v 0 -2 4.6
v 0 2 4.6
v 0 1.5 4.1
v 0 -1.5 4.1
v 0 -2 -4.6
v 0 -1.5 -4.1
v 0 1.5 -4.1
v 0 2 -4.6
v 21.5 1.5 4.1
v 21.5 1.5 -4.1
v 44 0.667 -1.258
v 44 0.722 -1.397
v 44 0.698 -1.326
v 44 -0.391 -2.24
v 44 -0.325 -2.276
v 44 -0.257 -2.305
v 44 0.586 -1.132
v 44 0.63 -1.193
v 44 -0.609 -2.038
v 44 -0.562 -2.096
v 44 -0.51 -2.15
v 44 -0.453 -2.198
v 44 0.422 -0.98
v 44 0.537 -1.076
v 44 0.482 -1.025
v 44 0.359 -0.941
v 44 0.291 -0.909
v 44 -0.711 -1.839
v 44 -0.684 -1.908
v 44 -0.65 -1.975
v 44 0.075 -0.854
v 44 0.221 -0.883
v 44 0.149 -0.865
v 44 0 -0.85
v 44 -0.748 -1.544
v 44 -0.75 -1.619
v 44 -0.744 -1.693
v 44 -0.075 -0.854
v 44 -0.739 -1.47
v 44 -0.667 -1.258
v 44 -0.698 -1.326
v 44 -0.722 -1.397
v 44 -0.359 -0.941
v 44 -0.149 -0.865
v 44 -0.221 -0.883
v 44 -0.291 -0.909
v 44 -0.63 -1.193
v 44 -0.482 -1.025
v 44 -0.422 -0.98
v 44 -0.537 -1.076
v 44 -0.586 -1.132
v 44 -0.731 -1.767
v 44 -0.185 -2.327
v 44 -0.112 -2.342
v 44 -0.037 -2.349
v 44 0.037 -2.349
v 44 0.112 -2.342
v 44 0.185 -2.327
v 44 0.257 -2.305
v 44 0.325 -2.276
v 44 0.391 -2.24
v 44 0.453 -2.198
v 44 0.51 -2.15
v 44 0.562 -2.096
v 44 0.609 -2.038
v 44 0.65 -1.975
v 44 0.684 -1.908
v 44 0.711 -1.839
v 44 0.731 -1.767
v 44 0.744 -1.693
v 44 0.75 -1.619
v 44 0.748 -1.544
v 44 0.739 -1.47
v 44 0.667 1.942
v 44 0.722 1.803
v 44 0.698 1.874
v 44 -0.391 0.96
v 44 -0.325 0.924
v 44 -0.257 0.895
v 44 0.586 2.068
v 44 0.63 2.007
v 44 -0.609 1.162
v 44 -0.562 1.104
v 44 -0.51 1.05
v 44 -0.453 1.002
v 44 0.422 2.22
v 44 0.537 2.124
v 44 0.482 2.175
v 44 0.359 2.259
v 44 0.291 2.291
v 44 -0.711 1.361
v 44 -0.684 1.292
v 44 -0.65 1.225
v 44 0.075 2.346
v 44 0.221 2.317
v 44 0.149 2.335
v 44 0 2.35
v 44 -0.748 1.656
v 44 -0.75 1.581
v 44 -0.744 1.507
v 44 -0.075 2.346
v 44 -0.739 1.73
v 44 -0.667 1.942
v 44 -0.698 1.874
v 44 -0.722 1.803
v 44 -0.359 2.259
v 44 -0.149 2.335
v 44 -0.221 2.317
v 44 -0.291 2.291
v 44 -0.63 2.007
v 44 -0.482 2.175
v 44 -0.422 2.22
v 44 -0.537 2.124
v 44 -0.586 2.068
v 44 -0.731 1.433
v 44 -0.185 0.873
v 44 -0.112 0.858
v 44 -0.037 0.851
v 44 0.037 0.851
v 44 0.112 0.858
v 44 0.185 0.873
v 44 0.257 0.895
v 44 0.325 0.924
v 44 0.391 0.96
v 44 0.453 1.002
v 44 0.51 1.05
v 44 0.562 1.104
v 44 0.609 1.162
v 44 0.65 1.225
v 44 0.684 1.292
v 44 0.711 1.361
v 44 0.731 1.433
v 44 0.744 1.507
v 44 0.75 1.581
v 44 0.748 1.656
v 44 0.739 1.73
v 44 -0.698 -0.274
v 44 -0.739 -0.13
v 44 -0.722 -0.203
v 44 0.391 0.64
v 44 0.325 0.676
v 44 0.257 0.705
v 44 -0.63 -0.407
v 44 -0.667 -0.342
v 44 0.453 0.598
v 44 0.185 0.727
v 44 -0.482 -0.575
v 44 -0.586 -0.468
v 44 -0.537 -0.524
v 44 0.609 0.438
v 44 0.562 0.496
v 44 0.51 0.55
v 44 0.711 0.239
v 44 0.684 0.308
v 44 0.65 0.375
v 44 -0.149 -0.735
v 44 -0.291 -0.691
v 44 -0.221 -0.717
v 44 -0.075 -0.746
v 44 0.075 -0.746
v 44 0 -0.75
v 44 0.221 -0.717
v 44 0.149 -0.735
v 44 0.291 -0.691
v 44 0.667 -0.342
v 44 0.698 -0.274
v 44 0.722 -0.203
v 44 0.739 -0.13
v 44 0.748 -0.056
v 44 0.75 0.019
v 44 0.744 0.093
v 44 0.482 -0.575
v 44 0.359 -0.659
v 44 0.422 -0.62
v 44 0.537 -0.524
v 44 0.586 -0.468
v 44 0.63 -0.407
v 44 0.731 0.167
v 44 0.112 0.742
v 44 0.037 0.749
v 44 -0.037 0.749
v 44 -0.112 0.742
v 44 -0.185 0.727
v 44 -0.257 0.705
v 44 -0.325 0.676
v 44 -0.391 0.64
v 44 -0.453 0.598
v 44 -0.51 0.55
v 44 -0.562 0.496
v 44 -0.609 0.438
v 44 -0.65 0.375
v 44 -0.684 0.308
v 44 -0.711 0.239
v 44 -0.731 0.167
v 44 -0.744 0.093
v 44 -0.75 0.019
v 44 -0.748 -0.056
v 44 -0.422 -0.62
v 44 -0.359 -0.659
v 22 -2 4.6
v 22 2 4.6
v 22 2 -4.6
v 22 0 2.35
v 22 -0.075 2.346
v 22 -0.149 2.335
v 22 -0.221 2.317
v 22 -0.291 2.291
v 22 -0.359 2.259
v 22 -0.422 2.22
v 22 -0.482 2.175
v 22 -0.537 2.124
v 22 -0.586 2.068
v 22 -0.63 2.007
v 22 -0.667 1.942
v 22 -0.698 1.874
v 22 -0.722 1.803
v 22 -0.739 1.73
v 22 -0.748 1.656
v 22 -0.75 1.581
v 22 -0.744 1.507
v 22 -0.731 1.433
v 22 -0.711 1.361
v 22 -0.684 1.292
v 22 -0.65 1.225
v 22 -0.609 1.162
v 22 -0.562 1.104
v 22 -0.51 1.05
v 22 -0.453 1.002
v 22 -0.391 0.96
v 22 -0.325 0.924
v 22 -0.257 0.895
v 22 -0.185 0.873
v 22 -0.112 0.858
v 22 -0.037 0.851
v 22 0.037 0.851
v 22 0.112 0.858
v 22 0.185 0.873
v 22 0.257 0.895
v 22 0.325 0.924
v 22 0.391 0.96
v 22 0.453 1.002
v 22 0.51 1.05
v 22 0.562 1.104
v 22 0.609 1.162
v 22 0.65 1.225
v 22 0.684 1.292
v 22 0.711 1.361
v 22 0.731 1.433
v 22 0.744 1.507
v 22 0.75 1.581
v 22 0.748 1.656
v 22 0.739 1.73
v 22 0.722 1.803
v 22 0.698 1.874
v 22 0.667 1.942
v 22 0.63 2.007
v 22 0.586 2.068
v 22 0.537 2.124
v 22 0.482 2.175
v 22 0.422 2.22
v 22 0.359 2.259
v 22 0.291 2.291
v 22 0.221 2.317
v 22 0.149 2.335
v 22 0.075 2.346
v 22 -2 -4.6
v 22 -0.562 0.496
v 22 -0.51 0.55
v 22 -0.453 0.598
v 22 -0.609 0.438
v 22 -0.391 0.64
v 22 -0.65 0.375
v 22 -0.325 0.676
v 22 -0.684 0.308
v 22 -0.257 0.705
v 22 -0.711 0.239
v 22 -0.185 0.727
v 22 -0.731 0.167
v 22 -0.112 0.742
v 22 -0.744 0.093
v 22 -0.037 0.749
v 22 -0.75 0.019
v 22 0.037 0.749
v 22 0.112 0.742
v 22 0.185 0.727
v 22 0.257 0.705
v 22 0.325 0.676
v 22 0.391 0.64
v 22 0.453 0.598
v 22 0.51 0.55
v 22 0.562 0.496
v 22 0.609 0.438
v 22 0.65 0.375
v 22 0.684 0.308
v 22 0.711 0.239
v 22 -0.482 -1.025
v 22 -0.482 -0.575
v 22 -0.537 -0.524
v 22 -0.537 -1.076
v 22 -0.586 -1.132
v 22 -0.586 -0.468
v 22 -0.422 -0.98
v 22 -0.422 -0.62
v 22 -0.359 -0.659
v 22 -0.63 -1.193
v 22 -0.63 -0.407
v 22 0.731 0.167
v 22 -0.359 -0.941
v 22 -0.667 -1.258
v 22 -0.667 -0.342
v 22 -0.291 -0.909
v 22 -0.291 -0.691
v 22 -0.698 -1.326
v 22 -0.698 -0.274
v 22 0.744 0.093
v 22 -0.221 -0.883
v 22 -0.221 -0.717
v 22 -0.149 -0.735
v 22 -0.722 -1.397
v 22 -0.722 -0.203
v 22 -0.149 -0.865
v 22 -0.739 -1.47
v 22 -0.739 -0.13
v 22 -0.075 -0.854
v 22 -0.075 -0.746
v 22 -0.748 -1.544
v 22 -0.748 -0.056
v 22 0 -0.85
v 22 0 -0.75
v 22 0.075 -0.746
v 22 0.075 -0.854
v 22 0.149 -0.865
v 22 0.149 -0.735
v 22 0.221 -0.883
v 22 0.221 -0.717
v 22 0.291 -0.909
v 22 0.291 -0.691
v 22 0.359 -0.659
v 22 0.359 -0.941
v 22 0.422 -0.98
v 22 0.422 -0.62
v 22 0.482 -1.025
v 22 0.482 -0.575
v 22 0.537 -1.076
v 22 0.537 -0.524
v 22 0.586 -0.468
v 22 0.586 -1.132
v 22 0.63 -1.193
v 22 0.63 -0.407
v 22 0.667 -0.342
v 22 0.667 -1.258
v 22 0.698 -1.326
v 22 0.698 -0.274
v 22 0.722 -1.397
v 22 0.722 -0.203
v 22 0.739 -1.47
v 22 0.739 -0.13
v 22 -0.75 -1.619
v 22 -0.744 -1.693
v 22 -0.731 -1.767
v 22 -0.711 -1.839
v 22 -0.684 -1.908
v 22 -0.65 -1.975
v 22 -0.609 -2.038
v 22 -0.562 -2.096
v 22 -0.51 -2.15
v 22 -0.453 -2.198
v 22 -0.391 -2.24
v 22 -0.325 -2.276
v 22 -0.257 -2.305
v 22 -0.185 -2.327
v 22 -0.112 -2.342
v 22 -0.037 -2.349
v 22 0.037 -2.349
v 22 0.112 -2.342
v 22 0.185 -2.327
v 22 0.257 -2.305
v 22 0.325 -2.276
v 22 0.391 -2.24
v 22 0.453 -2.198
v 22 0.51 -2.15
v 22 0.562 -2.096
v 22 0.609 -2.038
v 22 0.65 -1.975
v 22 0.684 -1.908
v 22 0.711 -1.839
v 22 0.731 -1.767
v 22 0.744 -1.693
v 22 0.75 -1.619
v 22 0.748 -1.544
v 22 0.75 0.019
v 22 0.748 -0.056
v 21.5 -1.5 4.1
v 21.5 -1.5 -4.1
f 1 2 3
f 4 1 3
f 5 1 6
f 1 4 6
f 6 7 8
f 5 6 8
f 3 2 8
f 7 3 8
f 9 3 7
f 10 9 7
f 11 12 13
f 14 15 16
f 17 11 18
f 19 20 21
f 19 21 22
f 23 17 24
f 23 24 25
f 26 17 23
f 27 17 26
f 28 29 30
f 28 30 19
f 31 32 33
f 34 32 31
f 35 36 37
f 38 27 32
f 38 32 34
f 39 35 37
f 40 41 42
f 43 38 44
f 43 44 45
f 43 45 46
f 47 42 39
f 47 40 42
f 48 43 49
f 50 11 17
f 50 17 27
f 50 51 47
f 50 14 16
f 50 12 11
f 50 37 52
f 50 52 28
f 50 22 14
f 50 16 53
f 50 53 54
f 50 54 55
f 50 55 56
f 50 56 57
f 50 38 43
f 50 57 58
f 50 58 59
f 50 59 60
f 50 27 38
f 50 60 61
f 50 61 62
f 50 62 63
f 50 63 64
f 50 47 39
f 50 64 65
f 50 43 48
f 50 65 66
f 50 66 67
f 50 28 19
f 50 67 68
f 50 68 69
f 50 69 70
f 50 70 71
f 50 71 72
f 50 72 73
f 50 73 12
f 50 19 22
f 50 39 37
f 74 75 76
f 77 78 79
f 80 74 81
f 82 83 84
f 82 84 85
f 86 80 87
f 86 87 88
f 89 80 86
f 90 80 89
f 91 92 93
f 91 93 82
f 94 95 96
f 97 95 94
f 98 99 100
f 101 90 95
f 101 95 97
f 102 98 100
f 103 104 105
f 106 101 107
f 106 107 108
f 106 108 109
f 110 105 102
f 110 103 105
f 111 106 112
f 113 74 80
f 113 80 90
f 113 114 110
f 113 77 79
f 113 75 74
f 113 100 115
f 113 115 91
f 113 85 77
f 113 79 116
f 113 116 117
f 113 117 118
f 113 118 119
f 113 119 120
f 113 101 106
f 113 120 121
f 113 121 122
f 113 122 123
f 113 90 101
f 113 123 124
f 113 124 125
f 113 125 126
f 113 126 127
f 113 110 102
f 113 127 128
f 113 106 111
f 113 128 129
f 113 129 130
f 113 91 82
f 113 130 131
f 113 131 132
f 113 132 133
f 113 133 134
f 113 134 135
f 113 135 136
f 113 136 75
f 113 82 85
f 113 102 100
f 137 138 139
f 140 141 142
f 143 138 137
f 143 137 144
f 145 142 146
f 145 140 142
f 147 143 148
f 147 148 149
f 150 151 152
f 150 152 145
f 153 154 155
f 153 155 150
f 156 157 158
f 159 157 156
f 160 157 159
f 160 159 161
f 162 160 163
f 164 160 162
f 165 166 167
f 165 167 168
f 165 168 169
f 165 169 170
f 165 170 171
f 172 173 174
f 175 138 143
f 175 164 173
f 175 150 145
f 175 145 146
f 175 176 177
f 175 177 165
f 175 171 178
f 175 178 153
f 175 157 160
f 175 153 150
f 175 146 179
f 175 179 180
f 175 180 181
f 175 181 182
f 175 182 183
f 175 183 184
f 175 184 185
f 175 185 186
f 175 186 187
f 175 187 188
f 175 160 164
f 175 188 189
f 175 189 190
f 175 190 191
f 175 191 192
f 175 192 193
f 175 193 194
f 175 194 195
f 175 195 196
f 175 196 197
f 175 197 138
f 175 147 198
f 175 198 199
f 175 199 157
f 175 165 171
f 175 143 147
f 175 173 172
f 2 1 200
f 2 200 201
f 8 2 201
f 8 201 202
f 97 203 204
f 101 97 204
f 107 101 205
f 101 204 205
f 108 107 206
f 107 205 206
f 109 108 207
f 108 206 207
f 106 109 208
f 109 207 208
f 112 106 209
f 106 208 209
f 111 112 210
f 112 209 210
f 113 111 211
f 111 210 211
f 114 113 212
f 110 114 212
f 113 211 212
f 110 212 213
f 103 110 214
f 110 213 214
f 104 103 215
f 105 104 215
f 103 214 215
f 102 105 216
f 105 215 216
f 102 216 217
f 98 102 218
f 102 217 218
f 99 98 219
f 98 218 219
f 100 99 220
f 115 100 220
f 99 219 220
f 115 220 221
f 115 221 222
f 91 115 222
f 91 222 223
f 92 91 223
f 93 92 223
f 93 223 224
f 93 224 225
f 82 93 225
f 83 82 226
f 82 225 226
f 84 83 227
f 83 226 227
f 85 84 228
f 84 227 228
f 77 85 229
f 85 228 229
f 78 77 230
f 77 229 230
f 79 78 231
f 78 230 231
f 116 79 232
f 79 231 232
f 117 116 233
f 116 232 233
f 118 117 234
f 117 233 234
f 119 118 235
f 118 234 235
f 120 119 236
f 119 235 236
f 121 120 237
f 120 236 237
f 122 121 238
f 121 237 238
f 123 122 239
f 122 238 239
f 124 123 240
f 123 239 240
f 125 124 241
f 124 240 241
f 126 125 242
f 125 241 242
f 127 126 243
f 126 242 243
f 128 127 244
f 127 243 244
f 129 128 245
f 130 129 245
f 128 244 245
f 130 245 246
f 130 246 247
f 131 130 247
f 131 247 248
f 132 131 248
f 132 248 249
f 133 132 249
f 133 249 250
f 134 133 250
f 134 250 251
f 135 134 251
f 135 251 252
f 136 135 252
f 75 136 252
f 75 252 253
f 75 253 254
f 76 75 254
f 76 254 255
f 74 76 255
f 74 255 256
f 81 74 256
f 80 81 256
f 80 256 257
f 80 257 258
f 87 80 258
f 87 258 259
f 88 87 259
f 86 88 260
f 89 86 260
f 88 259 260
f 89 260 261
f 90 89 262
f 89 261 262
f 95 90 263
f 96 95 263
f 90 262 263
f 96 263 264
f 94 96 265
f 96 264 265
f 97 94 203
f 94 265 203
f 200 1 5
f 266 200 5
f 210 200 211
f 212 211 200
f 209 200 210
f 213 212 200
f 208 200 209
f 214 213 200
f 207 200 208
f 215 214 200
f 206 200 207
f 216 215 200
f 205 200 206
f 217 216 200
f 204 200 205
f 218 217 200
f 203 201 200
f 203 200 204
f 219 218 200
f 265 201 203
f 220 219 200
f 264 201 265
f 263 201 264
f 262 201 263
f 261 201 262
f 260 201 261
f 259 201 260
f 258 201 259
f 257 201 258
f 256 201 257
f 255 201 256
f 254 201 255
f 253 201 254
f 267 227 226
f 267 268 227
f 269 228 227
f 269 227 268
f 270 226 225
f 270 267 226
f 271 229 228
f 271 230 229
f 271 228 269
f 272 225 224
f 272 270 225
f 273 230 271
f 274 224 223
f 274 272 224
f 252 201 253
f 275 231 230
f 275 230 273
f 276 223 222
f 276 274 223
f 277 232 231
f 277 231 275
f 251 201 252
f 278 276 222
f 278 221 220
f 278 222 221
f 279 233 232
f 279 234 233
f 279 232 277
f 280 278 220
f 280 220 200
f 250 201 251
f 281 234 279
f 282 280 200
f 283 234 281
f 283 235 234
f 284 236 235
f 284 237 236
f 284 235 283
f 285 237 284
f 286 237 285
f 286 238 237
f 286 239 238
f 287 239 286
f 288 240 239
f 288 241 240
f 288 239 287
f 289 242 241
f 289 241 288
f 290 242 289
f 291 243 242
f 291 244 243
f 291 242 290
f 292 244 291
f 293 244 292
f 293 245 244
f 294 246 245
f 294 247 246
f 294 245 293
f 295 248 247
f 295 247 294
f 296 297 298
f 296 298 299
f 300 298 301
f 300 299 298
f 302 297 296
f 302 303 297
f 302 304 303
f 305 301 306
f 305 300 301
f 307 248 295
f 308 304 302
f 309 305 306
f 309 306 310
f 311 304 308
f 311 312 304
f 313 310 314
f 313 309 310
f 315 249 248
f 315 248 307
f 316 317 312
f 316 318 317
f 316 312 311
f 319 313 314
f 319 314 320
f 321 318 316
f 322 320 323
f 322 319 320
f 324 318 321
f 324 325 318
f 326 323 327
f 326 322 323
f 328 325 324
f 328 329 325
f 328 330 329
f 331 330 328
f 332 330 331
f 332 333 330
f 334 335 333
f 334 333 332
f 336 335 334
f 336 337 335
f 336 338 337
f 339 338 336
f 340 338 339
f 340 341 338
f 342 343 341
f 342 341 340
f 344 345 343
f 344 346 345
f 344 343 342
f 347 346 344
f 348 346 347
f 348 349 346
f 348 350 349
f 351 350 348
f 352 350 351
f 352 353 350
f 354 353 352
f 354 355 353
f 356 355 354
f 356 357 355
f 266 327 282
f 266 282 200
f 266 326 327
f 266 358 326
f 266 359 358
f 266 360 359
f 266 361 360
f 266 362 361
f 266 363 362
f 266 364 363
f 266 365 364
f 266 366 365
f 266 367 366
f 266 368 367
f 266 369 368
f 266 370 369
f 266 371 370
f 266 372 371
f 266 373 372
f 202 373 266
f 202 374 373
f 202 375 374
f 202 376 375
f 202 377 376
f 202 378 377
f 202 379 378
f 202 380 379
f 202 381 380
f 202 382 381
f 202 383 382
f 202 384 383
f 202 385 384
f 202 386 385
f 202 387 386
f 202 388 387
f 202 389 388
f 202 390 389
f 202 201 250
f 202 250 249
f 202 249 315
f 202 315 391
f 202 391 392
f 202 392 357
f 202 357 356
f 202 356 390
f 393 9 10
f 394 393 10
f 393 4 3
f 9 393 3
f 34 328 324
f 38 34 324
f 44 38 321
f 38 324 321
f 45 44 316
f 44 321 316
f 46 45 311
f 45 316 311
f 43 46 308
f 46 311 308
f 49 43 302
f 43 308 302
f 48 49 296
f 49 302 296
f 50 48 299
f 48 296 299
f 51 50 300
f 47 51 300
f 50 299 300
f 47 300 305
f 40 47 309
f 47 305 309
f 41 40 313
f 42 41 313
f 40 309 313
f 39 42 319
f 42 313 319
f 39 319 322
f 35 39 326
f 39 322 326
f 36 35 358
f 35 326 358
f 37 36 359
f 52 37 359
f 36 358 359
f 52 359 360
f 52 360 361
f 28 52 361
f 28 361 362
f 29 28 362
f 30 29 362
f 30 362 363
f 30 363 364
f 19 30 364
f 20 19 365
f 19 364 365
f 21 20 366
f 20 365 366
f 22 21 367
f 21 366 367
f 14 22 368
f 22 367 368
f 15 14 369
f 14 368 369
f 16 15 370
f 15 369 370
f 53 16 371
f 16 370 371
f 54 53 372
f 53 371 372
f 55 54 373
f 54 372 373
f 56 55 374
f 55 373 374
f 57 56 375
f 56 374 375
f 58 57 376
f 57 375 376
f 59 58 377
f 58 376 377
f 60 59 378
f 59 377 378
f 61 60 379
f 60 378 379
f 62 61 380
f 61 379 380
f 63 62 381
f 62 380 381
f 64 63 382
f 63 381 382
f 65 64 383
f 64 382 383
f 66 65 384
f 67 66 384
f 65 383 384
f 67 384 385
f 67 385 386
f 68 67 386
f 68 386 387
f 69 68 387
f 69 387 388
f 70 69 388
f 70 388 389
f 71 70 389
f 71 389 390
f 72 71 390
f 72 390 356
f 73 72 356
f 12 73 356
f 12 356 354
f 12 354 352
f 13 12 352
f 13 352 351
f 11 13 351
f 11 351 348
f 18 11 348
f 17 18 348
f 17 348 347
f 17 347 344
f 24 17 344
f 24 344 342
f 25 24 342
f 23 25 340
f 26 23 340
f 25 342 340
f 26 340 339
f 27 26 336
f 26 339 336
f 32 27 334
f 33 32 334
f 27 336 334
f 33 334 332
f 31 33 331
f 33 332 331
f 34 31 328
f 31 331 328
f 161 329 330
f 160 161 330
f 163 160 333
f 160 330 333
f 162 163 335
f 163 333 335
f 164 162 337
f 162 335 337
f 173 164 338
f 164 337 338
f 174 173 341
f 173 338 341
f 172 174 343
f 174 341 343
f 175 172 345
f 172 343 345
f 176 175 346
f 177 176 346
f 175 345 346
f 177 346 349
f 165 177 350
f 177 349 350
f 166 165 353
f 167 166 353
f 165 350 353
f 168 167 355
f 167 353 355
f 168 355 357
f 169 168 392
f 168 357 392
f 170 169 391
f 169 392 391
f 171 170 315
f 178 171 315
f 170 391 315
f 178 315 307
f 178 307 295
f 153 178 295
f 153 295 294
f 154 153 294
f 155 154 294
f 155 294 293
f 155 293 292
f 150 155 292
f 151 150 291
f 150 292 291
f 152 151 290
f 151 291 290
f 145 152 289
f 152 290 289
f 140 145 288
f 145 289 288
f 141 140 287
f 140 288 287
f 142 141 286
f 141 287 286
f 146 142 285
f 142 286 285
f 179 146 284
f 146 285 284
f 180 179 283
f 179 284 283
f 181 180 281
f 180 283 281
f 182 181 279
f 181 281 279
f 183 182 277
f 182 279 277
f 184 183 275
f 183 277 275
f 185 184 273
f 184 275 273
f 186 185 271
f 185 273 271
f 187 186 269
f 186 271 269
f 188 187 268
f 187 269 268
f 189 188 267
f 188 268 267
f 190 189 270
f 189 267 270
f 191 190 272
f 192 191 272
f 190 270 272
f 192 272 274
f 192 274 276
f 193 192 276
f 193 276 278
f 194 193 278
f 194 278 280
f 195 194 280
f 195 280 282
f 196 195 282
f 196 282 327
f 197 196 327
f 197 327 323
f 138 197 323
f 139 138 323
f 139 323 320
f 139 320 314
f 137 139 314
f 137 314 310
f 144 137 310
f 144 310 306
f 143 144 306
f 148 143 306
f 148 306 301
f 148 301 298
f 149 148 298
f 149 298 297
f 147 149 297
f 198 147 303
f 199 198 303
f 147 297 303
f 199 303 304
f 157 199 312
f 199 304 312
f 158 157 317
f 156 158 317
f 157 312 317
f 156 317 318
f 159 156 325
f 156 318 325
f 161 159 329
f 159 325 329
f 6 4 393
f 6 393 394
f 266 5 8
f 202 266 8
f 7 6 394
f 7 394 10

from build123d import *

# Parameters (mm, degrees)
SKETCH1_W           = 9.2
SKETCH1_H           = 4
BOSS_EXTRUDE1_DEPTH = 22
SHELL1_T            = -0.5
SKETCH2_2_R         = 0.75
BOSS_EXTRUDE2_DEPTH = 22


with BuildPart() as part:
    # Sketch1 → Boss-Extrude1 (new body)
    with BuildSketch(Plane(origin=(0, 0, 0), x_dir=(0, 0, -1), z_dir=(1, 0, 0))):
        Rectangle(SKETCH1_W, SKETCH1_H)
    extrude(amount=BOSS_EXTRUDE1_DEPTH)

    # Shell1
    shell1_openings = [part.faces().sort_by_distance(p)[0] for p in [
        (0, 0, 0),
    ]]
    offset(amount=SHELL1_T, openings=shell1_openings, kind=Kind.INTERSECTION)

    # Sketch2<2> → Boss-Extrude2 (add)
    with BuildSketch(Plane(origin=(22, 0, 0), x_dir=(0, 0, -1), z_dir=(1, 0, 0))):
        Circle(SKETCH2_2_R)
        with Locations((-1.6, 0)):
            Circle(SKETCH2_2_R)
        with Locations((1.6, 0)):
            Circle(SKETCH2_2_R)
    extrude(amount=BOSS_EXTRUDE2_DEPTH)


solid = part.part
